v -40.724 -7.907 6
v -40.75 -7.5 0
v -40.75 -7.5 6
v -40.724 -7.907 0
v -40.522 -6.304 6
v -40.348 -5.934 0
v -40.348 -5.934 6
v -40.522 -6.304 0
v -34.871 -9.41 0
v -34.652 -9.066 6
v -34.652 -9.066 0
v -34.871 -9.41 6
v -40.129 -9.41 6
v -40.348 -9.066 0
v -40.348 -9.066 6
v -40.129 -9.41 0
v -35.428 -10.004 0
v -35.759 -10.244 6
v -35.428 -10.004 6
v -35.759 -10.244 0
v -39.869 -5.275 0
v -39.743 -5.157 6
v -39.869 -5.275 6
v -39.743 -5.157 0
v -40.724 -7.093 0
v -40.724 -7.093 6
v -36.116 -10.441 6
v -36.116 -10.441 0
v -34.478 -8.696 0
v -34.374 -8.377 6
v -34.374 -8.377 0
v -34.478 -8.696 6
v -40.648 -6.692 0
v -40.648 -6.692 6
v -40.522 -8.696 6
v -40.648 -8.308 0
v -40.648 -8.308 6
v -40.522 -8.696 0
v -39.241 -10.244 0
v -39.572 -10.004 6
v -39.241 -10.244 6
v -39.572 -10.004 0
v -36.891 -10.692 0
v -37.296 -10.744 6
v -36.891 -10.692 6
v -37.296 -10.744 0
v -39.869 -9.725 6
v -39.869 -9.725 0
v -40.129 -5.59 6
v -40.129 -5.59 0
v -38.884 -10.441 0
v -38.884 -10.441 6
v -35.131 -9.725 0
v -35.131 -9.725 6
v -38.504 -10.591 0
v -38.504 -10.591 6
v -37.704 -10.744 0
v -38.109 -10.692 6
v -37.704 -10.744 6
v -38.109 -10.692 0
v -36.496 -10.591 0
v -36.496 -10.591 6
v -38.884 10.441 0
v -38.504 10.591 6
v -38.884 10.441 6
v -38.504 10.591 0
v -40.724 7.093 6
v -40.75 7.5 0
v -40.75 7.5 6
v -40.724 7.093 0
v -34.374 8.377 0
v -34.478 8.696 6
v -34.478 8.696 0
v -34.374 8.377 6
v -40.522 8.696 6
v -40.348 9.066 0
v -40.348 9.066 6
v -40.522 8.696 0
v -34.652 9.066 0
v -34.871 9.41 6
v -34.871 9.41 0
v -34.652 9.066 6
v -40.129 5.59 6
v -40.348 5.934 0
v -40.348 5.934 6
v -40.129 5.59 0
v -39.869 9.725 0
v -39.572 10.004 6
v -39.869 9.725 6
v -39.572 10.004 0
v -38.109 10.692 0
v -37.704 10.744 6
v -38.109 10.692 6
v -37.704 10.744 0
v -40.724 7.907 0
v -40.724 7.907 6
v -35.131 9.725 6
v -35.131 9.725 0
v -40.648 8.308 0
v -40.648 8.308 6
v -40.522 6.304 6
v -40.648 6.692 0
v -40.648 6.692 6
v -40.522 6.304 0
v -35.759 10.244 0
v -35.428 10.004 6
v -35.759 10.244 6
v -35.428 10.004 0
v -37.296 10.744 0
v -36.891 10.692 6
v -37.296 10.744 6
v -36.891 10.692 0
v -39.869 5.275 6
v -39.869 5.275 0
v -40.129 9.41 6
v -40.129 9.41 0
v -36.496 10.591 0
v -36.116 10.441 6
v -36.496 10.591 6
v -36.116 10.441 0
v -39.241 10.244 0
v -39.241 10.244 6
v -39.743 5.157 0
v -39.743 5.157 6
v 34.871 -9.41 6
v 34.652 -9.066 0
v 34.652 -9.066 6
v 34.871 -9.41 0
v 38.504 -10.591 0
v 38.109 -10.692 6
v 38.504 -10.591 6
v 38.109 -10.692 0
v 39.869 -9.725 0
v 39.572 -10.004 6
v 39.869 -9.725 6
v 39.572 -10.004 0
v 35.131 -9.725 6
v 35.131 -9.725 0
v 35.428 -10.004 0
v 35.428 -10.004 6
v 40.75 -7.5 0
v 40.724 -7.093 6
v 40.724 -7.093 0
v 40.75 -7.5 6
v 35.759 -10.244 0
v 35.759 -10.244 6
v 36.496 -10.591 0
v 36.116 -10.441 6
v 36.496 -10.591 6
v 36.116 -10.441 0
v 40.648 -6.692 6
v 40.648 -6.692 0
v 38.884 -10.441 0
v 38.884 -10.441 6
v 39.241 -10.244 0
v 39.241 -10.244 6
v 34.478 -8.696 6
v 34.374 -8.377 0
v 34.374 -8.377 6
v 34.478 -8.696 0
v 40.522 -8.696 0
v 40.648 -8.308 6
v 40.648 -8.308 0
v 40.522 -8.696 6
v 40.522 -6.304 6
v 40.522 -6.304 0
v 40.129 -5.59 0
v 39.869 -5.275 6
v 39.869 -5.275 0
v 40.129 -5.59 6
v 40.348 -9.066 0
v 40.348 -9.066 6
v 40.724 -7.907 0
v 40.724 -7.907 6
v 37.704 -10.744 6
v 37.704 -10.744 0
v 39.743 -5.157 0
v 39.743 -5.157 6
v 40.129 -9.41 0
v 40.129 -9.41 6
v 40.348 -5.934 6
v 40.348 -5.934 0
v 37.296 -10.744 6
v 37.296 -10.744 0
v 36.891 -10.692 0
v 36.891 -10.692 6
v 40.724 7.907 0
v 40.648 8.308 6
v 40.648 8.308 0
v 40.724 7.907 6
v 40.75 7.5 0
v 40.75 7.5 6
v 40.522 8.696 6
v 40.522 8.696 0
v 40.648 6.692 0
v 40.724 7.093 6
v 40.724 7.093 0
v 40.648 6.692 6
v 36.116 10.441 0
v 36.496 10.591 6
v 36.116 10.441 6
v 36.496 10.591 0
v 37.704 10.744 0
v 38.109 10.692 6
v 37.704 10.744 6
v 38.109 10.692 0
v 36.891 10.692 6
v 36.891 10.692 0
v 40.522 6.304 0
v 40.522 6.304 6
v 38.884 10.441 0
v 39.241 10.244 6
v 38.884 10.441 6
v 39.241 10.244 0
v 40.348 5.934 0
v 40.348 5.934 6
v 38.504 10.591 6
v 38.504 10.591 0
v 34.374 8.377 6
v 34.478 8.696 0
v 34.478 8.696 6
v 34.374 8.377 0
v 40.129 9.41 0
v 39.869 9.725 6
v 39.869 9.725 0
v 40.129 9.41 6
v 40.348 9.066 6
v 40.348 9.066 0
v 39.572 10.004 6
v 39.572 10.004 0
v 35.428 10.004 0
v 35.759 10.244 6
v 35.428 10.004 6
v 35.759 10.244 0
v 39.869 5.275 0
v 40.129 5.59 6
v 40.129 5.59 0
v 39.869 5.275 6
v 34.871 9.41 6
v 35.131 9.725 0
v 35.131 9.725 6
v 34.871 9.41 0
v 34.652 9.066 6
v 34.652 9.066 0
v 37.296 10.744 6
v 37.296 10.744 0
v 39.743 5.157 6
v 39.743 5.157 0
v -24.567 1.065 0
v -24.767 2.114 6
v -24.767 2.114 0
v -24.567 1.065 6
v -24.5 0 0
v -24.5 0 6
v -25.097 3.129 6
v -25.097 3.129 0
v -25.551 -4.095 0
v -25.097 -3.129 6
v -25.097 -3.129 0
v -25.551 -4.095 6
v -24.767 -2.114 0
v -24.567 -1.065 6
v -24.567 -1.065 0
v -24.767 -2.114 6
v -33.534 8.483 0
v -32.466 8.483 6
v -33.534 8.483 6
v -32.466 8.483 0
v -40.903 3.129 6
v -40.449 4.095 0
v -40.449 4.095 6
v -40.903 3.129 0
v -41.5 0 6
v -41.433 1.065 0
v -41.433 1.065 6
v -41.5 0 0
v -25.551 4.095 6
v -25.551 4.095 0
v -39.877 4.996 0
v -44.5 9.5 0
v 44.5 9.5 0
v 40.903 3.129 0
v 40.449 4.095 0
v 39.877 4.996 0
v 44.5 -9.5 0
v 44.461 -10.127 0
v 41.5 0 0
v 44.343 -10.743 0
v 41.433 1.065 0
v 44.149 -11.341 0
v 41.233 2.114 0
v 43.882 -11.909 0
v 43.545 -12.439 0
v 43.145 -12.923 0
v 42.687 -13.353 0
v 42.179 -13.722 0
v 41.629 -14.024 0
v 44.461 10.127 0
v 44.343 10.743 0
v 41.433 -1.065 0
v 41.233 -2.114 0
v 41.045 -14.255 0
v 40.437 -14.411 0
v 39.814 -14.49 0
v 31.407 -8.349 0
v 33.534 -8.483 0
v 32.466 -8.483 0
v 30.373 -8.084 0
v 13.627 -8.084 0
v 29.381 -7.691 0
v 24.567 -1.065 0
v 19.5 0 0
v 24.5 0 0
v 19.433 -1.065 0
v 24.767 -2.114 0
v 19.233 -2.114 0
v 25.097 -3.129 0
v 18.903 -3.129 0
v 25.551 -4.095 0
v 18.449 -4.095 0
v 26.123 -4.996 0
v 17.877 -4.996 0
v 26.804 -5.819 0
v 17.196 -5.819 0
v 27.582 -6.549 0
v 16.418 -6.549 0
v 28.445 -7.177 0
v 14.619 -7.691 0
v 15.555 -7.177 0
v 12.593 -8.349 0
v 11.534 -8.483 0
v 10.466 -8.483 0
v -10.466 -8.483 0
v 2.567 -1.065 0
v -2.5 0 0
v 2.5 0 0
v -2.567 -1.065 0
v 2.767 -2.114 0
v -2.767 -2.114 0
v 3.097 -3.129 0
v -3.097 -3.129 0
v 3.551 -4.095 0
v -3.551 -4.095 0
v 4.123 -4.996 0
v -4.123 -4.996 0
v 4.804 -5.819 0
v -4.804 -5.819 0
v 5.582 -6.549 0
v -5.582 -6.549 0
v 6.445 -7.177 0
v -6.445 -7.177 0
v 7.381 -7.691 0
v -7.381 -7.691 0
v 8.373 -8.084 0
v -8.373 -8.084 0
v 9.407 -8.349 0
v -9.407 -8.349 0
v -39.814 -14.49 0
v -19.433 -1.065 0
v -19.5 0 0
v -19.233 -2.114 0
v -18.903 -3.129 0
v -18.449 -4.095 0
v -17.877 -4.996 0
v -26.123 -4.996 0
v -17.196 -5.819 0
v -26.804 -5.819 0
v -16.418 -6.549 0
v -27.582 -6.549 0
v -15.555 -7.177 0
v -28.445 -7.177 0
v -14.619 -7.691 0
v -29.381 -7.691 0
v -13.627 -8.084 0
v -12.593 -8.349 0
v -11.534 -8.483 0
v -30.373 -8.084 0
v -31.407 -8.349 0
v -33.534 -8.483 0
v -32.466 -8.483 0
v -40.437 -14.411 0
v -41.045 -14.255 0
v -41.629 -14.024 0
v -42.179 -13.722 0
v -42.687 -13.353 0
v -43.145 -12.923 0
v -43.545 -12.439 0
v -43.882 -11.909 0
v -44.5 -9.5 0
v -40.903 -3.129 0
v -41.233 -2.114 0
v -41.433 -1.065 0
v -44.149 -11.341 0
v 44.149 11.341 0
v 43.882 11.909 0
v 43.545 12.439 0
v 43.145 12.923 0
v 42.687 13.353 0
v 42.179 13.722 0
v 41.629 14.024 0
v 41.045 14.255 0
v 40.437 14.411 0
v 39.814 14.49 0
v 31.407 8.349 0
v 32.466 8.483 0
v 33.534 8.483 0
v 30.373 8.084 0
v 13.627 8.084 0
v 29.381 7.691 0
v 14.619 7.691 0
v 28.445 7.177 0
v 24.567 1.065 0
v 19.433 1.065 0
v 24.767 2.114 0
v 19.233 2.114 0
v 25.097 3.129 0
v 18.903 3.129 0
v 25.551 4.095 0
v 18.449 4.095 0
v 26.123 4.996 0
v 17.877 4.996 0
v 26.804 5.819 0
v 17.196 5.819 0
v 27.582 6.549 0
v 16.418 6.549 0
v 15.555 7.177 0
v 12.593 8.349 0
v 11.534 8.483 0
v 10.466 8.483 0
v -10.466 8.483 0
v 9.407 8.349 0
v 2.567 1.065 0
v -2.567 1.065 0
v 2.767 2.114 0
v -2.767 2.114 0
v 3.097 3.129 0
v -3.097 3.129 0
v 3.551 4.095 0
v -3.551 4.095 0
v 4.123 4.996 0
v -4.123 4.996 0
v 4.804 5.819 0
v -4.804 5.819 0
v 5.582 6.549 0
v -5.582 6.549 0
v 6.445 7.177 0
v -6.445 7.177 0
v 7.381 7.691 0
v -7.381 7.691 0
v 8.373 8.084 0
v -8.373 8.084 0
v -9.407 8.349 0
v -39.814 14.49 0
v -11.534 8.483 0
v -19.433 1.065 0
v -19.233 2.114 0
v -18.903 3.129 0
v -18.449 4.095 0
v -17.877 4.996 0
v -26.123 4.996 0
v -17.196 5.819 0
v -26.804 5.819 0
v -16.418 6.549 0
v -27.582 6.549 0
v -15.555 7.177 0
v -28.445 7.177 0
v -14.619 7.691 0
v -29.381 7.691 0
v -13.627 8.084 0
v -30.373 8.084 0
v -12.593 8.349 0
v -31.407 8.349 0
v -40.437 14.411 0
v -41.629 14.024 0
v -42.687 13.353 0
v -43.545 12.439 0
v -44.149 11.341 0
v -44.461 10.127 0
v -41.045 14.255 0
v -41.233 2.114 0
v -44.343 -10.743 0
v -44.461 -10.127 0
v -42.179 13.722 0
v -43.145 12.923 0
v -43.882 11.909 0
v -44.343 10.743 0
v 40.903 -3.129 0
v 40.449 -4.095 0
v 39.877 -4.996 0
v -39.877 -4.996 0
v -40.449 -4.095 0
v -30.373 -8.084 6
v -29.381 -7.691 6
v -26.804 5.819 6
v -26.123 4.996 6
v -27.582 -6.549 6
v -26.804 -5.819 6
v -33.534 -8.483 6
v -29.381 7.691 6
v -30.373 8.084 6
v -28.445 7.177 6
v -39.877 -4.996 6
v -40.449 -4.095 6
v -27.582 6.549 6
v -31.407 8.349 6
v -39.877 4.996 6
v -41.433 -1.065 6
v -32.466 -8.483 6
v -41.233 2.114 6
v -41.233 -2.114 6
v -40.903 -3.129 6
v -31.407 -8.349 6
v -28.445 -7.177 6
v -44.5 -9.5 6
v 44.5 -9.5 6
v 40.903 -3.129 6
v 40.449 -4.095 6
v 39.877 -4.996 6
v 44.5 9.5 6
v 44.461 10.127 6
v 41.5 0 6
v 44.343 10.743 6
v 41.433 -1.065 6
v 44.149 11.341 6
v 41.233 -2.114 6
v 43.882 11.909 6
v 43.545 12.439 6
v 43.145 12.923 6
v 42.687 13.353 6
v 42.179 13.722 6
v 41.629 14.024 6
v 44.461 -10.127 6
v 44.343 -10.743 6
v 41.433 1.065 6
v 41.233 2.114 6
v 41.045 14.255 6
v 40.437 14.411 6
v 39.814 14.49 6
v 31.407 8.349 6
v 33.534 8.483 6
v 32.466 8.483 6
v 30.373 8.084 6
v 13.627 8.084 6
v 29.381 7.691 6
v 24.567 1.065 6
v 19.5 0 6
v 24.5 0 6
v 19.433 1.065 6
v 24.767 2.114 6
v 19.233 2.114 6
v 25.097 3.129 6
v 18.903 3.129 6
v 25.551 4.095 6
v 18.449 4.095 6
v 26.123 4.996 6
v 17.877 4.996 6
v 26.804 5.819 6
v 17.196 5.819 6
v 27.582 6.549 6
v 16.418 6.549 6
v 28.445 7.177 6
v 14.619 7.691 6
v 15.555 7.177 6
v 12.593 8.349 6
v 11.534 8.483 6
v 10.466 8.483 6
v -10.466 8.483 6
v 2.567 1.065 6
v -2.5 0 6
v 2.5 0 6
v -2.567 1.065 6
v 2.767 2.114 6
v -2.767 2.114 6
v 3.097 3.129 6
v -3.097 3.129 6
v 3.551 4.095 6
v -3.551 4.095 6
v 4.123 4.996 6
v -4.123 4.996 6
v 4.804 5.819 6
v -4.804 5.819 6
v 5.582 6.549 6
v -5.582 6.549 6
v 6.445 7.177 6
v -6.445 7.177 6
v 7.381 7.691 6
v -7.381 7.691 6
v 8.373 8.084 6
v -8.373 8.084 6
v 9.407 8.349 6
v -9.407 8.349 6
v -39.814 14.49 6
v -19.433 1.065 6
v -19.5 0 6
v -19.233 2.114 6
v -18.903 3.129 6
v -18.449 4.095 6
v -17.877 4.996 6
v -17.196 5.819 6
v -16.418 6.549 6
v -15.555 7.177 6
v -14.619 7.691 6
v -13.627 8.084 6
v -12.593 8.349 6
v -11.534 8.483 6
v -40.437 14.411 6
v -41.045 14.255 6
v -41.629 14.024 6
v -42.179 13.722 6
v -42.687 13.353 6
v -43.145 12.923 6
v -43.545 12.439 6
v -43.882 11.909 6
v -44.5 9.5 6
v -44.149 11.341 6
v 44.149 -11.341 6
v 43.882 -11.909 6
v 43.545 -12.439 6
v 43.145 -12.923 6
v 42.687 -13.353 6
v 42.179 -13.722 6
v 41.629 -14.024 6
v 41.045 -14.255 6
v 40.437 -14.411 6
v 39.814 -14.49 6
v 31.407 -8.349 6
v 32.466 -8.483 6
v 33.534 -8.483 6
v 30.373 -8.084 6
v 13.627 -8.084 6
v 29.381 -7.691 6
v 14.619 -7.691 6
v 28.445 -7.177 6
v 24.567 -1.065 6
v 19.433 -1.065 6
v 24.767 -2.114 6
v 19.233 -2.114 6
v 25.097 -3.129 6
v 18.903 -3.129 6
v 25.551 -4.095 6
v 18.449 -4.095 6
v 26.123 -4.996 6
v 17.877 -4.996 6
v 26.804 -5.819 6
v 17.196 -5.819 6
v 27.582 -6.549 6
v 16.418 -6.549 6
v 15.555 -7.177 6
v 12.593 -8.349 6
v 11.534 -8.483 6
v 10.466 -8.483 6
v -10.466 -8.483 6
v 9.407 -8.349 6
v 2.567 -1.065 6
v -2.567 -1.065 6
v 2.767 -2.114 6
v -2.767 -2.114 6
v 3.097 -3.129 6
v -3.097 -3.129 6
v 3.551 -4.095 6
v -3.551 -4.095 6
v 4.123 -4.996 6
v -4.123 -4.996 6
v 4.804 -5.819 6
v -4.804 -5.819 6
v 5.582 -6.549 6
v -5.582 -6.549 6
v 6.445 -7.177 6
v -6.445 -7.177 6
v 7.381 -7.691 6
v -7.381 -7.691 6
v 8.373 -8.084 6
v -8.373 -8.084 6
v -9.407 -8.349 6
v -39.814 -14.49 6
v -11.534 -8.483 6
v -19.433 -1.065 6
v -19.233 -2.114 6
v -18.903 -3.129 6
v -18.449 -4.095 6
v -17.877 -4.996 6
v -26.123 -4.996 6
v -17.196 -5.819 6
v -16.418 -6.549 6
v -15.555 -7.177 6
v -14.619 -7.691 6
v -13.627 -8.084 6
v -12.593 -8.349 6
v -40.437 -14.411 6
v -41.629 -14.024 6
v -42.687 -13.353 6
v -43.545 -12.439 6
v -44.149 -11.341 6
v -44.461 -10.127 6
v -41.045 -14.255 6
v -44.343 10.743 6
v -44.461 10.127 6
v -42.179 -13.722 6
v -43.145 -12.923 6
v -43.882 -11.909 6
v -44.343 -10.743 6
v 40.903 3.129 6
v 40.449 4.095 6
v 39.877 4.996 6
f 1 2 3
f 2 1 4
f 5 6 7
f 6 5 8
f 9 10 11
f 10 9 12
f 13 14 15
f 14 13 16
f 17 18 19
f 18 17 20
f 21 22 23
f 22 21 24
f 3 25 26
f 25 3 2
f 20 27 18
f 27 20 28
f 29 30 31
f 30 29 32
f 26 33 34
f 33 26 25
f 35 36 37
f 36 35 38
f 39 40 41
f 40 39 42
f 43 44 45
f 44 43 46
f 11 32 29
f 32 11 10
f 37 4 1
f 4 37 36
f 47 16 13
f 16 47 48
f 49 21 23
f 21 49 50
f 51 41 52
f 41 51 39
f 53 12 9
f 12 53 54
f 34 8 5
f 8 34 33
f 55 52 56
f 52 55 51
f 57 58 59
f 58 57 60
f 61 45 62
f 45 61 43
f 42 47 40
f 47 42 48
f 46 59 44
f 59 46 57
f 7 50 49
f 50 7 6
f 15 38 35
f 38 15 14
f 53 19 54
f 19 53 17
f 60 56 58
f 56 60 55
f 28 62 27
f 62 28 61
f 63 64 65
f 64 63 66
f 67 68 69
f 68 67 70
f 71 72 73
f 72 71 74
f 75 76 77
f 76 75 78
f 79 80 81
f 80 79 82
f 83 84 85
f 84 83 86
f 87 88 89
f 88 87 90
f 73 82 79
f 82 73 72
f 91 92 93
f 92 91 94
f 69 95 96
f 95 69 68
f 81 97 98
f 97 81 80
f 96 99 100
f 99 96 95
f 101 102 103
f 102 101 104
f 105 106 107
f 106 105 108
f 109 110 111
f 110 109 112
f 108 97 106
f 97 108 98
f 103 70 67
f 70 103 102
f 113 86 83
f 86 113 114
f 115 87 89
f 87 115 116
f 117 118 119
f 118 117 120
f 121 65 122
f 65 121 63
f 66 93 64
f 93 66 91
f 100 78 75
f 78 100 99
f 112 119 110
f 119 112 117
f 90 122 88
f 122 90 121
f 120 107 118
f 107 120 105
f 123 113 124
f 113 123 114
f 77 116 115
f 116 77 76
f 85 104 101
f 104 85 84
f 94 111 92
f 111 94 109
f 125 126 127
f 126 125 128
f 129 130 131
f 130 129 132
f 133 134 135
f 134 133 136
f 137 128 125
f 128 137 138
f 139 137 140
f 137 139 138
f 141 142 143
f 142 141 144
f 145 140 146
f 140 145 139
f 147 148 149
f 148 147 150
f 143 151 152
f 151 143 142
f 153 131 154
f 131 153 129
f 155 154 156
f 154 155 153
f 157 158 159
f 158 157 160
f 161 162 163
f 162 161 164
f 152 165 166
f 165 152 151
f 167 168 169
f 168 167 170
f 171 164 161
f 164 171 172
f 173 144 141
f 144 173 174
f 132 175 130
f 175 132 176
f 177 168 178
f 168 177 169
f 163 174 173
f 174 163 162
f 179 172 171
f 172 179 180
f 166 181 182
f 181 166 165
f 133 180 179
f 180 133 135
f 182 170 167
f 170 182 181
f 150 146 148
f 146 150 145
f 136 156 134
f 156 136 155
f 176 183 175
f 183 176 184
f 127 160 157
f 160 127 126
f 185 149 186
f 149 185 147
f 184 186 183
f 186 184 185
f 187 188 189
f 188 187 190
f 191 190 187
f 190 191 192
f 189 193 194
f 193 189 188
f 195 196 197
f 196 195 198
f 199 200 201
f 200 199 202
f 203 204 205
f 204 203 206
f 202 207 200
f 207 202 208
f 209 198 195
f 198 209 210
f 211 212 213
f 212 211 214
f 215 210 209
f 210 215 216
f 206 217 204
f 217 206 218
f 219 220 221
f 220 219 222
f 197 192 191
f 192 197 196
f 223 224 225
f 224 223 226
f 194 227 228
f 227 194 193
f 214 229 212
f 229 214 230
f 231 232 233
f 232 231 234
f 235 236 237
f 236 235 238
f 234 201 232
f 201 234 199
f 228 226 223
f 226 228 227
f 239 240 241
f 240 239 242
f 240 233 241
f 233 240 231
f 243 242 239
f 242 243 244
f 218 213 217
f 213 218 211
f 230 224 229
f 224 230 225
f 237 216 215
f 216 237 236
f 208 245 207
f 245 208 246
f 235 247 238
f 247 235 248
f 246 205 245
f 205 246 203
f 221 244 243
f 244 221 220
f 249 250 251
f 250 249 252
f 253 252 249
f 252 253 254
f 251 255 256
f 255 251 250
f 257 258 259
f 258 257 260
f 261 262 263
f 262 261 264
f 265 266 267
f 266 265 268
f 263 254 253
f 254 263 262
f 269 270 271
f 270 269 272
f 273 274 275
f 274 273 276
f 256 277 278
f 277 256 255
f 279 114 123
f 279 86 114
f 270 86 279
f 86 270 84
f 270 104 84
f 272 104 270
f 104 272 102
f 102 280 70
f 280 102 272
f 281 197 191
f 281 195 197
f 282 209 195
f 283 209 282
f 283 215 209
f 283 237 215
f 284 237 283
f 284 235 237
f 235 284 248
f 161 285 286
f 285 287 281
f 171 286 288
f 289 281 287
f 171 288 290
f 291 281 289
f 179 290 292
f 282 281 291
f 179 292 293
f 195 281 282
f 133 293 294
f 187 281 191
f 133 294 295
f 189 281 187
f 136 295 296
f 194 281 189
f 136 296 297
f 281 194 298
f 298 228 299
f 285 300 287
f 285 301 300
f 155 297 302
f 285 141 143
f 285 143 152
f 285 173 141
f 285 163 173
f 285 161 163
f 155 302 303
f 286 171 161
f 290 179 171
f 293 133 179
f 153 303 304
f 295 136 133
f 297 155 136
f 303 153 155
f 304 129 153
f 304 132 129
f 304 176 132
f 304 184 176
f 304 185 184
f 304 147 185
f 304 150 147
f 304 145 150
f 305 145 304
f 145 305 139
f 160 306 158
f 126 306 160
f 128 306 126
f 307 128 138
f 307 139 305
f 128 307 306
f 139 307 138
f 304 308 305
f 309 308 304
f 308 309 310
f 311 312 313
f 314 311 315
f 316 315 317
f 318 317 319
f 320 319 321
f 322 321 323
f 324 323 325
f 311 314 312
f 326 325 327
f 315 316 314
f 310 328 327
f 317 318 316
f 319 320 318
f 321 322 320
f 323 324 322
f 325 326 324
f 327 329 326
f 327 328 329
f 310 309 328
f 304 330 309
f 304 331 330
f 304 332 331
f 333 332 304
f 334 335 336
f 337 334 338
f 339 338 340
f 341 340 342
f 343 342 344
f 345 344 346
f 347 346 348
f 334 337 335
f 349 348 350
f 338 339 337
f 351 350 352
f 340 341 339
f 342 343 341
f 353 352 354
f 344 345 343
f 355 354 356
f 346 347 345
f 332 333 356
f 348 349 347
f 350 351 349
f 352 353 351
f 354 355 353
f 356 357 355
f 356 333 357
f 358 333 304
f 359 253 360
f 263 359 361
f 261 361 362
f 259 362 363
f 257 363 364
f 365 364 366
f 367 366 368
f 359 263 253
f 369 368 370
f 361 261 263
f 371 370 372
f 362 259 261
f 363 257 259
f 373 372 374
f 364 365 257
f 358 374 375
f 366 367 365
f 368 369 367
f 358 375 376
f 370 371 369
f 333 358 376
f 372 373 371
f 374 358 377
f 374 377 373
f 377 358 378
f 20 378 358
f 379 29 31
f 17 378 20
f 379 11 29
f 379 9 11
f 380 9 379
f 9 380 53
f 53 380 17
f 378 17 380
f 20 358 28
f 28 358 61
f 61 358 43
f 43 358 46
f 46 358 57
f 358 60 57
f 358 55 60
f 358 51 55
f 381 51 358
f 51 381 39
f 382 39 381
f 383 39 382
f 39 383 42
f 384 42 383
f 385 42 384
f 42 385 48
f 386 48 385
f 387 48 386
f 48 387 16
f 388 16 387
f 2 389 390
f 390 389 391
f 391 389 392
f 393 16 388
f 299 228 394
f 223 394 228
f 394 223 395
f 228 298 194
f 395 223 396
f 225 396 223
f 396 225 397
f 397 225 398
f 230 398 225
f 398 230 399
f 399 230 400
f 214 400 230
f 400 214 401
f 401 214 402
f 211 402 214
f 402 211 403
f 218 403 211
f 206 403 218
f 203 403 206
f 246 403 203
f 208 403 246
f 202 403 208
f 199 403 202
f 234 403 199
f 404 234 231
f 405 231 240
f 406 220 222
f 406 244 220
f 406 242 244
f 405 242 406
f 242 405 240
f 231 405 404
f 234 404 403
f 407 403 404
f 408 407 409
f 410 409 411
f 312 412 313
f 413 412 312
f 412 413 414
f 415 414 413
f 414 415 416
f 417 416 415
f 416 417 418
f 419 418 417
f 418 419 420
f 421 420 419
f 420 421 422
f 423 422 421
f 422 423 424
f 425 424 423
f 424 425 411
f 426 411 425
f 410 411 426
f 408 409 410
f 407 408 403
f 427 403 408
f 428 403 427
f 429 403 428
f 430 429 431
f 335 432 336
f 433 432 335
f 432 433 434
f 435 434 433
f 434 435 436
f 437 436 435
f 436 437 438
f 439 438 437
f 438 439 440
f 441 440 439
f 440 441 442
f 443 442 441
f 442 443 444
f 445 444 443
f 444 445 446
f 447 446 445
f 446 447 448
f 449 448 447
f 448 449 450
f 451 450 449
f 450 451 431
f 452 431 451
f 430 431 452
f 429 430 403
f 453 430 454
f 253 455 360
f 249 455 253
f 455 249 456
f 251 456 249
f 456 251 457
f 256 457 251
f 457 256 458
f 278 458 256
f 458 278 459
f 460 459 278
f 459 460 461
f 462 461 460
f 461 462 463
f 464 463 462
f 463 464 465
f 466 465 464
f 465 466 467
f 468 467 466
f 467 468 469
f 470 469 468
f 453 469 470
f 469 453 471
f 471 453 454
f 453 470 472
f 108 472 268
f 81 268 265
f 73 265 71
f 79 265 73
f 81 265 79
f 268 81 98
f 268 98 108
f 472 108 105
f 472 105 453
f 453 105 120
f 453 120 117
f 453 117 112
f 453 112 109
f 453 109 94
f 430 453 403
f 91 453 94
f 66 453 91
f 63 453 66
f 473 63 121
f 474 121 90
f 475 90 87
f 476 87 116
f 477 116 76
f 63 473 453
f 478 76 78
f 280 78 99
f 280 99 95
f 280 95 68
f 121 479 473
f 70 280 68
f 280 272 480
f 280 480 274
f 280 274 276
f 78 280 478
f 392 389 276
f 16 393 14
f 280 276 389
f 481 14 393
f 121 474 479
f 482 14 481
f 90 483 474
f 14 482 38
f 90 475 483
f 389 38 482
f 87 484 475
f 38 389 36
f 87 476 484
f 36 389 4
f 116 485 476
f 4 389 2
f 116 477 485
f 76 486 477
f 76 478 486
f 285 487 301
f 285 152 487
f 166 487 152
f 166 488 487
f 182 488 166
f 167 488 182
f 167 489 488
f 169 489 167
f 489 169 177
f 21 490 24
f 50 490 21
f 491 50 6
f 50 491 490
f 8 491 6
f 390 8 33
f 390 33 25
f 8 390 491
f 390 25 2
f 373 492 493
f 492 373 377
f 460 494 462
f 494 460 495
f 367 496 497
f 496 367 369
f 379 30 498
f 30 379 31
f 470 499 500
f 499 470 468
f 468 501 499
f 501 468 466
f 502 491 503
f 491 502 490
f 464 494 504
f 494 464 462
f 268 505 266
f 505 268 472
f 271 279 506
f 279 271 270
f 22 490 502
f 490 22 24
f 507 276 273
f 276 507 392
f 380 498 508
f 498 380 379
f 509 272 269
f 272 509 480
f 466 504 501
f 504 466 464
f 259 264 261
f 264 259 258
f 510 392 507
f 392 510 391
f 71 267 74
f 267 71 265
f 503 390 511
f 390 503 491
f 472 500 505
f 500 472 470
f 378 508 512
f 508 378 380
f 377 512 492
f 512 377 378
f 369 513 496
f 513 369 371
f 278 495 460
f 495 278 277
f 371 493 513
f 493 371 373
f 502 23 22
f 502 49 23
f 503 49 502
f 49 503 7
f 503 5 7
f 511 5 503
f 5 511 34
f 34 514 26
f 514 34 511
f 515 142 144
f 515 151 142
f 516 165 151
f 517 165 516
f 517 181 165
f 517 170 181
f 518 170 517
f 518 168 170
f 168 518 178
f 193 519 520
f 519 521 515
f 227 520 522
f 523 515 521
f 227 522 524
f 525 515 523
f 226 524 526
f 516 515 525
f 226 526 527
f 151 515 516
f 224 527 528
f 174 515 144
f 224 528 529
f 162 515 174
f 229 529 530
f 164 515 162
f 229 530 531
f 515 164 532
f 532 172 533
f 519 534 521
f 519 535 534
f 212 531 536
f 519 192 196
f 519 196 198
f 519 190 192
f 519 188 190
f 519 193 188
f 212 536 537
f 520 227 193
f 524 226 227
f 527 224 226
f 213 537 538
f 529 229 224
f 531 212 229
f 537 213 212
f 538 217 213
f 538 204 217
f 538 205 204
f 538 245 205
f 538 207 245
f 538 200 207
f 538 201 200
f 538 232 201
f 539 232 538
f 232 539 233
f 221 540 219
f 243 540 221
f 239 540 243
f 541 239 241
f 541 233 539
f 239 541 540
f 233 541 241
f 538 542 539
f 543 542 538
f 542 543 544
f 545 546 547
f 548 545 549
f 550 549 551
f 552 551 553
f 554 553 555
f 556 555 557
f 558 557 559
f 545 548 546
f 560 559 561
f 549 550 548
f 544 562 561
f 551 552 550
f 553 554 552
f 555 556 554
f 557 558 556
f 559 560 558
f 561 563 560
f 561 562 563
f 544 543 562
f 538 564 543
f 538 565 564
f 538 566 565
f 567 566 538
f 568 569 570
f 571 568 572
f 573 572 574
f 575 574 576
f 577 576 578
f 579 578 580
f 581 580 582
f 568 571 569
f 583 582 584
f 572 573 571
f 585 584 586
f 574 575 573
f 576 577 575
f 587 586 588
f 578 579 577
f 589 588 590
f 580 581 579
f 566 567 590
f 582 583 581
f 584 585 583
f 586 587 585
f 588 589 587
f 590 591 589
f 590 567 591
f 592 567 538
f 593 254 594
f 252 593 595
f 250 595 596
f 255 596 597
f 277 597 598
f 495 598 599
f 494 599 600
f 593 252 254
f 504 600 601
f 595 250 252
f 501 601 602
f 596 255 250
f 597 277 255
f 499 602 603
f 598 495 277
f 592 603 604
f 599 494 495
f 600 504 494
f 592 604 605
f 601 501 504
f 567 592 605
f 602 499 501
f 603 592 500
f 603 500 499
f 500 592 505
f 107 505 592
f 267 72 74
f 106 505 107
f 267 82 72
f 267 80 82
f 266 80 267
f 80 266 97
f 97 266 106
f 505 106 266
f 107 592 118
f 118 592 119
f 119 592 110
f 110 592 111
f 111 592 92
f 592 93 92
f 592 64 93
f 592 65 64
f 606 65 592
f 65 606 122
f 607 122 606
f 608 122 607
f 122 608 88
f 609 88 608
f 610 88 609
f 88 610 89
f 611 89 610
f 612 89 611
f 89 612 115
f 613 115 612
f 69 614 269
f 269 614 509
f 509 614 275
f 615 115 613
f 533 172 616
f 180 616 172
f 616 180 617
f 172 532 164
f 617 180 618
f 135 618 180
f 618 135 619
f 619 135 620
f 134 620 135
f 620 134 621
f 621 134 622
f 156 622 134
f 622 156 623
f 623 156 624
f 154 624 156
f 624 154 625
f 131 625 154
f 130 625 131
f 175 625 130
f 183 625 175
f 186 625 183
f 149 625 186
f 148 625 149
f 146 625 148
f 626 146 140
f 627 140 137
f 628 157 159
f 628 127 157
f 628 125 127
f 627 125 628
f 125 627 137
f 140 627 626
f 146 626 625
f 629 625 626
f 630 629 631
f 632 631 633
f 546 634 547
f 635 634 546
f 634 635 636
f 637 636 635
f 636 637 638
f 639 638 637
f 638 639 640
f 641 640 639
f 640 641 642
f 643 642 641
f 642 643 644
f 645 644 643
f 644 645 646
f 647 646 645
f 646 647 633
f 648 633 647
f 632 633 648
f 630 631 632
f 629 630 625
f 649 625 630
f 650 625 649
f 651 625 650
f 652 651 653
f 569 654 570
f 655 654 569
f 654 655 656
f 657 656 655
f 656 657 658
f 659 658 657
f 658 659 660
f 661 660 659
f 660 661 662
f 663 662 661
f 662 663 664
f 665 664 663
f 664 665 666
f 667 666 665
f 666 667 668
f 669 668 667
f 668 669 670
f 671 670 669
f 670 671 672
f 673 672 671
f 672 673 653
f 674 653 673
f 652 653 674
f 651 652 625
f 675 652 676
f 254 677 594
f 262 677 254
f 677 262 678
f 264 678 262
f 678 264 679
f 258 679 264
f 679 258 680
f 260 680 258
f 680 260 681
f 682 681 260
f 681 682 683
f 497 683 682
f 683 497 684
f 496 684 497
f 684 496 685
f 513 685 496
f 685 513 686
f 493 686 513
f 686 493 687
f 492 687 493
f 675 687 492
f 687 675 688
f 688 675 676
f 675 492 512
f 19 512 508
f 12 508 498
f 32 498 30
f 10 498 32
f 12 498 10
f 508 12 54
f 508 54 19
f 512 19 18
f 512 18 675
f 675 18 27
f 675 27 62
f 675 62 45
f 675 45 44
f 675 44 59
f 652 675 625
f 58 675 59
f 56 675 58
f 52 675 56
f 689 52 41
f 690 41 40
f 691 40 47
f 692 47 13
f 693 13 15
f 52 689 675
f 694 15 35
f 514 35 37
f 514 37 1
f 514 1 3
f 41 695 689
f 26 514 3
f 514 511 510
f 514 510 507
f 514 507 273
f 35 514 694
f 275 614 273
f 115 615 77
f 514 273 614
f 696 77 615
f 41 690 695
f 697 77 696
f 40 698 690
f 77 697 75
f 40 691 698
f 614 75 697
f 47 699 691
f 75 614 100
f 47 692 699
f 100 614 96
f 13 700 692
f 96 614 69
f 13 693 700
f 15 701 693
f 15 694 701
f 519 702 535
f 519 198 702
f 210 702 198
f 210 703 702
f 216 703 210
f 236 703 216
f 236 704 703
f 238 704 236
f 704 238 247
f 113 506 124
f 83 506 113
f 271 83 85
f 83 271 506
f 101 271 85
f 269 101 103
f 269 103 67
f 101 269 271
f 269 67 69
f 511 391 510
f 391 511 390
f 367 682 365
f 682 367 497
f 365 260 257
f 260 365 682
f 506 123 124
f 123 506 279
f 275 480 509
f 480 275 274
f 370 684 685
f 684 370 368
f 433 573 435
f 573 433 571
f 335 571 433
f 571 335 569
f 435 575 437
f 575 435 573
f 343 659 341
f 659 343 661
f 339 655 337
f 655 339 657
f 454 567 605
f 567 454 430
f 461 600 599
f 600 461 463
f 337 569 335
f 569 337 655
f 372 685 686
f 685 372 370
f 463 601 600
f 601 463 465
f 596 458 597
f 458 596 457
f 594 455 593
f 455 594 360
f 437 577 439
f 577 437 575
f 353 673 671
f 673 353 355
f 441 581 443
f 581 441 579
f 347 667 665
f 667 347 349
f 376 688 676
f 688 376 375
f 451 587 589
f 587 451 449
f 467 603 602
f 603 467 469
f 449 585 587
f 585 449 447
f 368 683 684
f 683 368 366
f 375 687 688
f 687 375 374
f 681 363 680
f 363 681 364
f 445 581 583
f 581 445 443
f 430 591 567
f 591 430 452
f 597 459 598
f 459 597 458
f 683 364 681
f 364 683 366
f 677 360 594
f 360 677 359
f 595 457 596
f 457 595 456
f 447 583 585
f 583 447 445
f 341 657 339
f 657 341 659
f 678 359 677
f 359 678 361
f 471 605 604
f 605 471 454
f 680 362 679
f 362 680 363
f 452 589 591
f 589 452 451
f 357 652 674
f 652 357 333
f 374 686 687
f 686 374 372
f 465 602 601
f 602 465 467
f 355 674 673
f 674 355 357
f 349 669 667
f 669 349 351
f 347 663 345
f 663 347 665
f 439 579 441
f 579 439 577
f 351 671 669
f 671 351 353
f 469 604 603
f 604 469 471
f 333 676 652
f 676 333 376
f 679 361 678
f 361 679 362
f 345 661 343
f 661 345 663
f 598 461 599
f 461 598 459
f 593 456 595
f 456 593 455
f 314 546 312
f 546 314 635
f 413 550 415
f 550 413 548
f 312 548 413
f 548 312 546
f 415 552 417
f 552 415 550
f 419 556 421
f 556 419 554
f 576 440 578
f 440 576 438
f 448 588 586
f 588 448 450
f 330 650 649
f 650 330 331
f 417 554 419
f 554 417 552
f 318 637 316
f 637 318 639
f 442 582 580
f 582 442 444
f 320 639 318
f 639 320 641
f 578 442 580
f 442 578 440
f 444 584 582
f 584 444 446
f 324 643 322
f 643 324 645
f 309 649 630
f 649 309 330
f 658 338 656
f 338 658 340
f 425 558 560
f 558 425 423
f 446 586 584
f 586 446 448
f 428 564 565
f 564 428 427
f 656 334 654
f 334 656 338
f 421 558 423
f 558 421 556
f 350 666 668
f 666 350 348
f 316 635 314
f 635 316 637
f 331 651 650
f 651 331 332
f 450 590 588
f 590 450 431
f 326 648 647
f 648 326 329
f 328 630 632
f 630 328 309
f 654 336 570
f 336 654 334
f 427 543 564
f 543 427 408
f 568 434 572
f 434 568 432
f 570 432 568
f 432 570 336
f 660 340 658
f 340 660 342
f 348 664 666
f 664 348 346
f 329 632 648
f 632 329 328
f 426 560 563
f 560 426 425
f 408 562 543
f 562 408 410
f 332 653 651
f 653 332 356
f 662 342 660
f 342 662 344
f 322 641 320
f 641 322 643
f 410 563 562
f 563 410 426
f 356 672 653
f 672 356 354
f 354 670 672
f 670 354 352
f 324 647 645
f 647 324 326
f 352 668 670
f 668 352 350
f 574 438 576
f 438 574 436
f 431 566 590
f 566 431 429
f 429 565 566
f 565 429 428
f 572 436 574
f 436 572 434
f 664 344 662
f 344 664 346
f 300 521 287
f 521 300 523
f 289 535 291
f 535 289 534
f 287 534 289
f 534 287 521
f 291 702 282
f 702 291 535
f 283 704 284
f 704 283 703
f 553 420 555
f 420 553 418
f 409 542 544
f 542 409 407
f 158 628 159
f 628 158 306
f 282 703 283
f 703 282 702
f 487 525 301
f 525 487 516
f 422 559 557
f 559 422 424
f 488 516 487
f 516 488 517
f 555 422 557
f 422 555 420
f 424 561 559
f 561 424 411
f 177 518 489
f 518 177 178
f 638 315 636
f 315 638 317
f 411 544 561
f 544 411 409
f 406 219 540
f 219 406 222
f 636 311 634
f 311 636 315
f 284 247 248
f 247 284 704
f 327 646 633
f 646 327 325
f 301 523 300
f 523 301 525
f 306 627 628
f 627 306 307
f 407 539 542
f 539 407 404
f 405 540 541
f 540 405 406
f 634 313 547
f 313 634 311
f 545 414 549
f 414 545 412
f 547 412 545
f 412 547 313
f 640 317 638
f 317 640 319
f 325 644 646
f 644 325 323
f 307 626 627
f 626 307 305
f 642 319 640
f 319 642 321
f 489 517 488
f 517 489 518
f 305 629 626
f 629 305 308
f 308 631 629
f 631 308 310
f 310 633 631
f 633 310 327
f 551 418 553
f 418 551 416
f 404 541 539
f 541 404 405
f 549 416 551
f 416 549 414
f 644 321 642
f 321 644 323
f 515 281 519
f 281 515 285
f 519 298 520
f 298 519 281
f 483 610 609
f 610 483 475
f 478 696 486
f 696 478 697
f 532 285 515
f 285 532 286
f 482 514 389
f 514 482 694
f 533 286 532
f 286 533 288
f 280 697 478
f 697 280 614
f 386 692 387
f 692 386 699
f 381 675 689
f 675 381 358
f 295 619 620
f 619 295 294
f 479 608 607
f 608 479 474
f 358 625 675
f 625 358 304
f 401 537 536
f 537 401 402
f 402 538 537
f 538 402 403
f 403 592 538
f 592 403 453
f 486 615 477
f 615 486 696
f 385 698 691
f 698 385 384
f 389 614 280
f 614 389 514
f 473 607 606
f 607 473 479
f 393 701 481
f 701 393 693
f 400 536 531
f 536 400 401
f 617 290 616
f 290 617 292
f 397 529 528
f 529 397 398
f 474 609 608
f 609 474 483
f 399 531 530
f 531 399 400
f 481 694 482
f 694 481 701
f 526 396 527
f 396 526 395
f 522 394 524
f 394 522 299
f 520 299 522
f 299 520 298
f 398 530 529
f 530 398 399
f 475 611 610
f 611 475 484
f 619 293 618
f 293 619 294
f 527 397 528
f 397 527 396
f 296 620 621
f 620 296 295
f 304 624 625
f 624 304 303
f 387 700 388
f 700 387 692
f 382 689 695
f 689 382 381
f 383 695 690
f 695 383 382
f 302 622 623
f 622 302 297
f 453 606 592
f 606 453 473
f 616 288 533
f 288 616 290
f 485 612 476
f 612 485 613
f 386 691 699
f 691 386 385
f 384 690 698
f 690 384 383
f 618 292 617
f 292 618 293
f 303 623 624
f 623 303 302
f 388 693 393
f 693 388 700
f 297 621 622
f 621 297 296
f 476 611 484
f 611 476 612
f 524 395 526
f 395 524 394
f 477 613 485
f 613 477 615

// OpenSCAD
$fn = 50;


difference() {
	union() {
		hull() {
			translate(v = [-39.5000000000, 9.5000000000, 0]) {
				cylinder(h = 6, r = 5);
			}
			translate(v = [39.5000000000, 9.5000000000, 0]) {
				cylinder(h = 6, r = 5);
			}
			translate(v = [-39.5000000000, -9.5000000000, 0]) {
				cylinder(h = 6, r = 5);
			}
			translate(v = [39.5000000000, -9.5000000000, 0]) {
				cylinder(h = 6, r = 5);
			}
		}
	}
	union() {
		#translate(v = [-37.5000000000, -7.5000000000, -100.0000000000]) {
			cylinder(h = 200, r = 3.2500000000);
		}
		#translate(v = [-37.5000000000, 7.5000000000, -100.0000000000]) {
			cylinder(h = 200, r = 3.2500000000);
		}
		#translate(v = [37.5000000000, -7.5000000000, -100.0000000000]) {
			cylinder(h = 200, r = 3.2500000000);
		}
		#translate(v = [37.5000000000, 7.5000000000, -100.0000000000]) {
			cylinder(h = 200, r = 3.2500000000);
		}
		#translate(v = [-33.0000000000, 0, 0]) {
			cylinder(h = 6, r = 8.5000000000);
		}
		#translate(v = [-11.0000000000, 0, 0]) {
			cylinder(h = 6, r = 8.5000000000);
		}
		#translate(v = [11.0000000000, 0, 0]) {
			cylinder(h = 6, r = 8.5000000000);
		}
		#translate(v = [33.0000000000, 0, 0]) {
			cylinder(h = 6, r = 8.5000000000);
		}
	}
}
